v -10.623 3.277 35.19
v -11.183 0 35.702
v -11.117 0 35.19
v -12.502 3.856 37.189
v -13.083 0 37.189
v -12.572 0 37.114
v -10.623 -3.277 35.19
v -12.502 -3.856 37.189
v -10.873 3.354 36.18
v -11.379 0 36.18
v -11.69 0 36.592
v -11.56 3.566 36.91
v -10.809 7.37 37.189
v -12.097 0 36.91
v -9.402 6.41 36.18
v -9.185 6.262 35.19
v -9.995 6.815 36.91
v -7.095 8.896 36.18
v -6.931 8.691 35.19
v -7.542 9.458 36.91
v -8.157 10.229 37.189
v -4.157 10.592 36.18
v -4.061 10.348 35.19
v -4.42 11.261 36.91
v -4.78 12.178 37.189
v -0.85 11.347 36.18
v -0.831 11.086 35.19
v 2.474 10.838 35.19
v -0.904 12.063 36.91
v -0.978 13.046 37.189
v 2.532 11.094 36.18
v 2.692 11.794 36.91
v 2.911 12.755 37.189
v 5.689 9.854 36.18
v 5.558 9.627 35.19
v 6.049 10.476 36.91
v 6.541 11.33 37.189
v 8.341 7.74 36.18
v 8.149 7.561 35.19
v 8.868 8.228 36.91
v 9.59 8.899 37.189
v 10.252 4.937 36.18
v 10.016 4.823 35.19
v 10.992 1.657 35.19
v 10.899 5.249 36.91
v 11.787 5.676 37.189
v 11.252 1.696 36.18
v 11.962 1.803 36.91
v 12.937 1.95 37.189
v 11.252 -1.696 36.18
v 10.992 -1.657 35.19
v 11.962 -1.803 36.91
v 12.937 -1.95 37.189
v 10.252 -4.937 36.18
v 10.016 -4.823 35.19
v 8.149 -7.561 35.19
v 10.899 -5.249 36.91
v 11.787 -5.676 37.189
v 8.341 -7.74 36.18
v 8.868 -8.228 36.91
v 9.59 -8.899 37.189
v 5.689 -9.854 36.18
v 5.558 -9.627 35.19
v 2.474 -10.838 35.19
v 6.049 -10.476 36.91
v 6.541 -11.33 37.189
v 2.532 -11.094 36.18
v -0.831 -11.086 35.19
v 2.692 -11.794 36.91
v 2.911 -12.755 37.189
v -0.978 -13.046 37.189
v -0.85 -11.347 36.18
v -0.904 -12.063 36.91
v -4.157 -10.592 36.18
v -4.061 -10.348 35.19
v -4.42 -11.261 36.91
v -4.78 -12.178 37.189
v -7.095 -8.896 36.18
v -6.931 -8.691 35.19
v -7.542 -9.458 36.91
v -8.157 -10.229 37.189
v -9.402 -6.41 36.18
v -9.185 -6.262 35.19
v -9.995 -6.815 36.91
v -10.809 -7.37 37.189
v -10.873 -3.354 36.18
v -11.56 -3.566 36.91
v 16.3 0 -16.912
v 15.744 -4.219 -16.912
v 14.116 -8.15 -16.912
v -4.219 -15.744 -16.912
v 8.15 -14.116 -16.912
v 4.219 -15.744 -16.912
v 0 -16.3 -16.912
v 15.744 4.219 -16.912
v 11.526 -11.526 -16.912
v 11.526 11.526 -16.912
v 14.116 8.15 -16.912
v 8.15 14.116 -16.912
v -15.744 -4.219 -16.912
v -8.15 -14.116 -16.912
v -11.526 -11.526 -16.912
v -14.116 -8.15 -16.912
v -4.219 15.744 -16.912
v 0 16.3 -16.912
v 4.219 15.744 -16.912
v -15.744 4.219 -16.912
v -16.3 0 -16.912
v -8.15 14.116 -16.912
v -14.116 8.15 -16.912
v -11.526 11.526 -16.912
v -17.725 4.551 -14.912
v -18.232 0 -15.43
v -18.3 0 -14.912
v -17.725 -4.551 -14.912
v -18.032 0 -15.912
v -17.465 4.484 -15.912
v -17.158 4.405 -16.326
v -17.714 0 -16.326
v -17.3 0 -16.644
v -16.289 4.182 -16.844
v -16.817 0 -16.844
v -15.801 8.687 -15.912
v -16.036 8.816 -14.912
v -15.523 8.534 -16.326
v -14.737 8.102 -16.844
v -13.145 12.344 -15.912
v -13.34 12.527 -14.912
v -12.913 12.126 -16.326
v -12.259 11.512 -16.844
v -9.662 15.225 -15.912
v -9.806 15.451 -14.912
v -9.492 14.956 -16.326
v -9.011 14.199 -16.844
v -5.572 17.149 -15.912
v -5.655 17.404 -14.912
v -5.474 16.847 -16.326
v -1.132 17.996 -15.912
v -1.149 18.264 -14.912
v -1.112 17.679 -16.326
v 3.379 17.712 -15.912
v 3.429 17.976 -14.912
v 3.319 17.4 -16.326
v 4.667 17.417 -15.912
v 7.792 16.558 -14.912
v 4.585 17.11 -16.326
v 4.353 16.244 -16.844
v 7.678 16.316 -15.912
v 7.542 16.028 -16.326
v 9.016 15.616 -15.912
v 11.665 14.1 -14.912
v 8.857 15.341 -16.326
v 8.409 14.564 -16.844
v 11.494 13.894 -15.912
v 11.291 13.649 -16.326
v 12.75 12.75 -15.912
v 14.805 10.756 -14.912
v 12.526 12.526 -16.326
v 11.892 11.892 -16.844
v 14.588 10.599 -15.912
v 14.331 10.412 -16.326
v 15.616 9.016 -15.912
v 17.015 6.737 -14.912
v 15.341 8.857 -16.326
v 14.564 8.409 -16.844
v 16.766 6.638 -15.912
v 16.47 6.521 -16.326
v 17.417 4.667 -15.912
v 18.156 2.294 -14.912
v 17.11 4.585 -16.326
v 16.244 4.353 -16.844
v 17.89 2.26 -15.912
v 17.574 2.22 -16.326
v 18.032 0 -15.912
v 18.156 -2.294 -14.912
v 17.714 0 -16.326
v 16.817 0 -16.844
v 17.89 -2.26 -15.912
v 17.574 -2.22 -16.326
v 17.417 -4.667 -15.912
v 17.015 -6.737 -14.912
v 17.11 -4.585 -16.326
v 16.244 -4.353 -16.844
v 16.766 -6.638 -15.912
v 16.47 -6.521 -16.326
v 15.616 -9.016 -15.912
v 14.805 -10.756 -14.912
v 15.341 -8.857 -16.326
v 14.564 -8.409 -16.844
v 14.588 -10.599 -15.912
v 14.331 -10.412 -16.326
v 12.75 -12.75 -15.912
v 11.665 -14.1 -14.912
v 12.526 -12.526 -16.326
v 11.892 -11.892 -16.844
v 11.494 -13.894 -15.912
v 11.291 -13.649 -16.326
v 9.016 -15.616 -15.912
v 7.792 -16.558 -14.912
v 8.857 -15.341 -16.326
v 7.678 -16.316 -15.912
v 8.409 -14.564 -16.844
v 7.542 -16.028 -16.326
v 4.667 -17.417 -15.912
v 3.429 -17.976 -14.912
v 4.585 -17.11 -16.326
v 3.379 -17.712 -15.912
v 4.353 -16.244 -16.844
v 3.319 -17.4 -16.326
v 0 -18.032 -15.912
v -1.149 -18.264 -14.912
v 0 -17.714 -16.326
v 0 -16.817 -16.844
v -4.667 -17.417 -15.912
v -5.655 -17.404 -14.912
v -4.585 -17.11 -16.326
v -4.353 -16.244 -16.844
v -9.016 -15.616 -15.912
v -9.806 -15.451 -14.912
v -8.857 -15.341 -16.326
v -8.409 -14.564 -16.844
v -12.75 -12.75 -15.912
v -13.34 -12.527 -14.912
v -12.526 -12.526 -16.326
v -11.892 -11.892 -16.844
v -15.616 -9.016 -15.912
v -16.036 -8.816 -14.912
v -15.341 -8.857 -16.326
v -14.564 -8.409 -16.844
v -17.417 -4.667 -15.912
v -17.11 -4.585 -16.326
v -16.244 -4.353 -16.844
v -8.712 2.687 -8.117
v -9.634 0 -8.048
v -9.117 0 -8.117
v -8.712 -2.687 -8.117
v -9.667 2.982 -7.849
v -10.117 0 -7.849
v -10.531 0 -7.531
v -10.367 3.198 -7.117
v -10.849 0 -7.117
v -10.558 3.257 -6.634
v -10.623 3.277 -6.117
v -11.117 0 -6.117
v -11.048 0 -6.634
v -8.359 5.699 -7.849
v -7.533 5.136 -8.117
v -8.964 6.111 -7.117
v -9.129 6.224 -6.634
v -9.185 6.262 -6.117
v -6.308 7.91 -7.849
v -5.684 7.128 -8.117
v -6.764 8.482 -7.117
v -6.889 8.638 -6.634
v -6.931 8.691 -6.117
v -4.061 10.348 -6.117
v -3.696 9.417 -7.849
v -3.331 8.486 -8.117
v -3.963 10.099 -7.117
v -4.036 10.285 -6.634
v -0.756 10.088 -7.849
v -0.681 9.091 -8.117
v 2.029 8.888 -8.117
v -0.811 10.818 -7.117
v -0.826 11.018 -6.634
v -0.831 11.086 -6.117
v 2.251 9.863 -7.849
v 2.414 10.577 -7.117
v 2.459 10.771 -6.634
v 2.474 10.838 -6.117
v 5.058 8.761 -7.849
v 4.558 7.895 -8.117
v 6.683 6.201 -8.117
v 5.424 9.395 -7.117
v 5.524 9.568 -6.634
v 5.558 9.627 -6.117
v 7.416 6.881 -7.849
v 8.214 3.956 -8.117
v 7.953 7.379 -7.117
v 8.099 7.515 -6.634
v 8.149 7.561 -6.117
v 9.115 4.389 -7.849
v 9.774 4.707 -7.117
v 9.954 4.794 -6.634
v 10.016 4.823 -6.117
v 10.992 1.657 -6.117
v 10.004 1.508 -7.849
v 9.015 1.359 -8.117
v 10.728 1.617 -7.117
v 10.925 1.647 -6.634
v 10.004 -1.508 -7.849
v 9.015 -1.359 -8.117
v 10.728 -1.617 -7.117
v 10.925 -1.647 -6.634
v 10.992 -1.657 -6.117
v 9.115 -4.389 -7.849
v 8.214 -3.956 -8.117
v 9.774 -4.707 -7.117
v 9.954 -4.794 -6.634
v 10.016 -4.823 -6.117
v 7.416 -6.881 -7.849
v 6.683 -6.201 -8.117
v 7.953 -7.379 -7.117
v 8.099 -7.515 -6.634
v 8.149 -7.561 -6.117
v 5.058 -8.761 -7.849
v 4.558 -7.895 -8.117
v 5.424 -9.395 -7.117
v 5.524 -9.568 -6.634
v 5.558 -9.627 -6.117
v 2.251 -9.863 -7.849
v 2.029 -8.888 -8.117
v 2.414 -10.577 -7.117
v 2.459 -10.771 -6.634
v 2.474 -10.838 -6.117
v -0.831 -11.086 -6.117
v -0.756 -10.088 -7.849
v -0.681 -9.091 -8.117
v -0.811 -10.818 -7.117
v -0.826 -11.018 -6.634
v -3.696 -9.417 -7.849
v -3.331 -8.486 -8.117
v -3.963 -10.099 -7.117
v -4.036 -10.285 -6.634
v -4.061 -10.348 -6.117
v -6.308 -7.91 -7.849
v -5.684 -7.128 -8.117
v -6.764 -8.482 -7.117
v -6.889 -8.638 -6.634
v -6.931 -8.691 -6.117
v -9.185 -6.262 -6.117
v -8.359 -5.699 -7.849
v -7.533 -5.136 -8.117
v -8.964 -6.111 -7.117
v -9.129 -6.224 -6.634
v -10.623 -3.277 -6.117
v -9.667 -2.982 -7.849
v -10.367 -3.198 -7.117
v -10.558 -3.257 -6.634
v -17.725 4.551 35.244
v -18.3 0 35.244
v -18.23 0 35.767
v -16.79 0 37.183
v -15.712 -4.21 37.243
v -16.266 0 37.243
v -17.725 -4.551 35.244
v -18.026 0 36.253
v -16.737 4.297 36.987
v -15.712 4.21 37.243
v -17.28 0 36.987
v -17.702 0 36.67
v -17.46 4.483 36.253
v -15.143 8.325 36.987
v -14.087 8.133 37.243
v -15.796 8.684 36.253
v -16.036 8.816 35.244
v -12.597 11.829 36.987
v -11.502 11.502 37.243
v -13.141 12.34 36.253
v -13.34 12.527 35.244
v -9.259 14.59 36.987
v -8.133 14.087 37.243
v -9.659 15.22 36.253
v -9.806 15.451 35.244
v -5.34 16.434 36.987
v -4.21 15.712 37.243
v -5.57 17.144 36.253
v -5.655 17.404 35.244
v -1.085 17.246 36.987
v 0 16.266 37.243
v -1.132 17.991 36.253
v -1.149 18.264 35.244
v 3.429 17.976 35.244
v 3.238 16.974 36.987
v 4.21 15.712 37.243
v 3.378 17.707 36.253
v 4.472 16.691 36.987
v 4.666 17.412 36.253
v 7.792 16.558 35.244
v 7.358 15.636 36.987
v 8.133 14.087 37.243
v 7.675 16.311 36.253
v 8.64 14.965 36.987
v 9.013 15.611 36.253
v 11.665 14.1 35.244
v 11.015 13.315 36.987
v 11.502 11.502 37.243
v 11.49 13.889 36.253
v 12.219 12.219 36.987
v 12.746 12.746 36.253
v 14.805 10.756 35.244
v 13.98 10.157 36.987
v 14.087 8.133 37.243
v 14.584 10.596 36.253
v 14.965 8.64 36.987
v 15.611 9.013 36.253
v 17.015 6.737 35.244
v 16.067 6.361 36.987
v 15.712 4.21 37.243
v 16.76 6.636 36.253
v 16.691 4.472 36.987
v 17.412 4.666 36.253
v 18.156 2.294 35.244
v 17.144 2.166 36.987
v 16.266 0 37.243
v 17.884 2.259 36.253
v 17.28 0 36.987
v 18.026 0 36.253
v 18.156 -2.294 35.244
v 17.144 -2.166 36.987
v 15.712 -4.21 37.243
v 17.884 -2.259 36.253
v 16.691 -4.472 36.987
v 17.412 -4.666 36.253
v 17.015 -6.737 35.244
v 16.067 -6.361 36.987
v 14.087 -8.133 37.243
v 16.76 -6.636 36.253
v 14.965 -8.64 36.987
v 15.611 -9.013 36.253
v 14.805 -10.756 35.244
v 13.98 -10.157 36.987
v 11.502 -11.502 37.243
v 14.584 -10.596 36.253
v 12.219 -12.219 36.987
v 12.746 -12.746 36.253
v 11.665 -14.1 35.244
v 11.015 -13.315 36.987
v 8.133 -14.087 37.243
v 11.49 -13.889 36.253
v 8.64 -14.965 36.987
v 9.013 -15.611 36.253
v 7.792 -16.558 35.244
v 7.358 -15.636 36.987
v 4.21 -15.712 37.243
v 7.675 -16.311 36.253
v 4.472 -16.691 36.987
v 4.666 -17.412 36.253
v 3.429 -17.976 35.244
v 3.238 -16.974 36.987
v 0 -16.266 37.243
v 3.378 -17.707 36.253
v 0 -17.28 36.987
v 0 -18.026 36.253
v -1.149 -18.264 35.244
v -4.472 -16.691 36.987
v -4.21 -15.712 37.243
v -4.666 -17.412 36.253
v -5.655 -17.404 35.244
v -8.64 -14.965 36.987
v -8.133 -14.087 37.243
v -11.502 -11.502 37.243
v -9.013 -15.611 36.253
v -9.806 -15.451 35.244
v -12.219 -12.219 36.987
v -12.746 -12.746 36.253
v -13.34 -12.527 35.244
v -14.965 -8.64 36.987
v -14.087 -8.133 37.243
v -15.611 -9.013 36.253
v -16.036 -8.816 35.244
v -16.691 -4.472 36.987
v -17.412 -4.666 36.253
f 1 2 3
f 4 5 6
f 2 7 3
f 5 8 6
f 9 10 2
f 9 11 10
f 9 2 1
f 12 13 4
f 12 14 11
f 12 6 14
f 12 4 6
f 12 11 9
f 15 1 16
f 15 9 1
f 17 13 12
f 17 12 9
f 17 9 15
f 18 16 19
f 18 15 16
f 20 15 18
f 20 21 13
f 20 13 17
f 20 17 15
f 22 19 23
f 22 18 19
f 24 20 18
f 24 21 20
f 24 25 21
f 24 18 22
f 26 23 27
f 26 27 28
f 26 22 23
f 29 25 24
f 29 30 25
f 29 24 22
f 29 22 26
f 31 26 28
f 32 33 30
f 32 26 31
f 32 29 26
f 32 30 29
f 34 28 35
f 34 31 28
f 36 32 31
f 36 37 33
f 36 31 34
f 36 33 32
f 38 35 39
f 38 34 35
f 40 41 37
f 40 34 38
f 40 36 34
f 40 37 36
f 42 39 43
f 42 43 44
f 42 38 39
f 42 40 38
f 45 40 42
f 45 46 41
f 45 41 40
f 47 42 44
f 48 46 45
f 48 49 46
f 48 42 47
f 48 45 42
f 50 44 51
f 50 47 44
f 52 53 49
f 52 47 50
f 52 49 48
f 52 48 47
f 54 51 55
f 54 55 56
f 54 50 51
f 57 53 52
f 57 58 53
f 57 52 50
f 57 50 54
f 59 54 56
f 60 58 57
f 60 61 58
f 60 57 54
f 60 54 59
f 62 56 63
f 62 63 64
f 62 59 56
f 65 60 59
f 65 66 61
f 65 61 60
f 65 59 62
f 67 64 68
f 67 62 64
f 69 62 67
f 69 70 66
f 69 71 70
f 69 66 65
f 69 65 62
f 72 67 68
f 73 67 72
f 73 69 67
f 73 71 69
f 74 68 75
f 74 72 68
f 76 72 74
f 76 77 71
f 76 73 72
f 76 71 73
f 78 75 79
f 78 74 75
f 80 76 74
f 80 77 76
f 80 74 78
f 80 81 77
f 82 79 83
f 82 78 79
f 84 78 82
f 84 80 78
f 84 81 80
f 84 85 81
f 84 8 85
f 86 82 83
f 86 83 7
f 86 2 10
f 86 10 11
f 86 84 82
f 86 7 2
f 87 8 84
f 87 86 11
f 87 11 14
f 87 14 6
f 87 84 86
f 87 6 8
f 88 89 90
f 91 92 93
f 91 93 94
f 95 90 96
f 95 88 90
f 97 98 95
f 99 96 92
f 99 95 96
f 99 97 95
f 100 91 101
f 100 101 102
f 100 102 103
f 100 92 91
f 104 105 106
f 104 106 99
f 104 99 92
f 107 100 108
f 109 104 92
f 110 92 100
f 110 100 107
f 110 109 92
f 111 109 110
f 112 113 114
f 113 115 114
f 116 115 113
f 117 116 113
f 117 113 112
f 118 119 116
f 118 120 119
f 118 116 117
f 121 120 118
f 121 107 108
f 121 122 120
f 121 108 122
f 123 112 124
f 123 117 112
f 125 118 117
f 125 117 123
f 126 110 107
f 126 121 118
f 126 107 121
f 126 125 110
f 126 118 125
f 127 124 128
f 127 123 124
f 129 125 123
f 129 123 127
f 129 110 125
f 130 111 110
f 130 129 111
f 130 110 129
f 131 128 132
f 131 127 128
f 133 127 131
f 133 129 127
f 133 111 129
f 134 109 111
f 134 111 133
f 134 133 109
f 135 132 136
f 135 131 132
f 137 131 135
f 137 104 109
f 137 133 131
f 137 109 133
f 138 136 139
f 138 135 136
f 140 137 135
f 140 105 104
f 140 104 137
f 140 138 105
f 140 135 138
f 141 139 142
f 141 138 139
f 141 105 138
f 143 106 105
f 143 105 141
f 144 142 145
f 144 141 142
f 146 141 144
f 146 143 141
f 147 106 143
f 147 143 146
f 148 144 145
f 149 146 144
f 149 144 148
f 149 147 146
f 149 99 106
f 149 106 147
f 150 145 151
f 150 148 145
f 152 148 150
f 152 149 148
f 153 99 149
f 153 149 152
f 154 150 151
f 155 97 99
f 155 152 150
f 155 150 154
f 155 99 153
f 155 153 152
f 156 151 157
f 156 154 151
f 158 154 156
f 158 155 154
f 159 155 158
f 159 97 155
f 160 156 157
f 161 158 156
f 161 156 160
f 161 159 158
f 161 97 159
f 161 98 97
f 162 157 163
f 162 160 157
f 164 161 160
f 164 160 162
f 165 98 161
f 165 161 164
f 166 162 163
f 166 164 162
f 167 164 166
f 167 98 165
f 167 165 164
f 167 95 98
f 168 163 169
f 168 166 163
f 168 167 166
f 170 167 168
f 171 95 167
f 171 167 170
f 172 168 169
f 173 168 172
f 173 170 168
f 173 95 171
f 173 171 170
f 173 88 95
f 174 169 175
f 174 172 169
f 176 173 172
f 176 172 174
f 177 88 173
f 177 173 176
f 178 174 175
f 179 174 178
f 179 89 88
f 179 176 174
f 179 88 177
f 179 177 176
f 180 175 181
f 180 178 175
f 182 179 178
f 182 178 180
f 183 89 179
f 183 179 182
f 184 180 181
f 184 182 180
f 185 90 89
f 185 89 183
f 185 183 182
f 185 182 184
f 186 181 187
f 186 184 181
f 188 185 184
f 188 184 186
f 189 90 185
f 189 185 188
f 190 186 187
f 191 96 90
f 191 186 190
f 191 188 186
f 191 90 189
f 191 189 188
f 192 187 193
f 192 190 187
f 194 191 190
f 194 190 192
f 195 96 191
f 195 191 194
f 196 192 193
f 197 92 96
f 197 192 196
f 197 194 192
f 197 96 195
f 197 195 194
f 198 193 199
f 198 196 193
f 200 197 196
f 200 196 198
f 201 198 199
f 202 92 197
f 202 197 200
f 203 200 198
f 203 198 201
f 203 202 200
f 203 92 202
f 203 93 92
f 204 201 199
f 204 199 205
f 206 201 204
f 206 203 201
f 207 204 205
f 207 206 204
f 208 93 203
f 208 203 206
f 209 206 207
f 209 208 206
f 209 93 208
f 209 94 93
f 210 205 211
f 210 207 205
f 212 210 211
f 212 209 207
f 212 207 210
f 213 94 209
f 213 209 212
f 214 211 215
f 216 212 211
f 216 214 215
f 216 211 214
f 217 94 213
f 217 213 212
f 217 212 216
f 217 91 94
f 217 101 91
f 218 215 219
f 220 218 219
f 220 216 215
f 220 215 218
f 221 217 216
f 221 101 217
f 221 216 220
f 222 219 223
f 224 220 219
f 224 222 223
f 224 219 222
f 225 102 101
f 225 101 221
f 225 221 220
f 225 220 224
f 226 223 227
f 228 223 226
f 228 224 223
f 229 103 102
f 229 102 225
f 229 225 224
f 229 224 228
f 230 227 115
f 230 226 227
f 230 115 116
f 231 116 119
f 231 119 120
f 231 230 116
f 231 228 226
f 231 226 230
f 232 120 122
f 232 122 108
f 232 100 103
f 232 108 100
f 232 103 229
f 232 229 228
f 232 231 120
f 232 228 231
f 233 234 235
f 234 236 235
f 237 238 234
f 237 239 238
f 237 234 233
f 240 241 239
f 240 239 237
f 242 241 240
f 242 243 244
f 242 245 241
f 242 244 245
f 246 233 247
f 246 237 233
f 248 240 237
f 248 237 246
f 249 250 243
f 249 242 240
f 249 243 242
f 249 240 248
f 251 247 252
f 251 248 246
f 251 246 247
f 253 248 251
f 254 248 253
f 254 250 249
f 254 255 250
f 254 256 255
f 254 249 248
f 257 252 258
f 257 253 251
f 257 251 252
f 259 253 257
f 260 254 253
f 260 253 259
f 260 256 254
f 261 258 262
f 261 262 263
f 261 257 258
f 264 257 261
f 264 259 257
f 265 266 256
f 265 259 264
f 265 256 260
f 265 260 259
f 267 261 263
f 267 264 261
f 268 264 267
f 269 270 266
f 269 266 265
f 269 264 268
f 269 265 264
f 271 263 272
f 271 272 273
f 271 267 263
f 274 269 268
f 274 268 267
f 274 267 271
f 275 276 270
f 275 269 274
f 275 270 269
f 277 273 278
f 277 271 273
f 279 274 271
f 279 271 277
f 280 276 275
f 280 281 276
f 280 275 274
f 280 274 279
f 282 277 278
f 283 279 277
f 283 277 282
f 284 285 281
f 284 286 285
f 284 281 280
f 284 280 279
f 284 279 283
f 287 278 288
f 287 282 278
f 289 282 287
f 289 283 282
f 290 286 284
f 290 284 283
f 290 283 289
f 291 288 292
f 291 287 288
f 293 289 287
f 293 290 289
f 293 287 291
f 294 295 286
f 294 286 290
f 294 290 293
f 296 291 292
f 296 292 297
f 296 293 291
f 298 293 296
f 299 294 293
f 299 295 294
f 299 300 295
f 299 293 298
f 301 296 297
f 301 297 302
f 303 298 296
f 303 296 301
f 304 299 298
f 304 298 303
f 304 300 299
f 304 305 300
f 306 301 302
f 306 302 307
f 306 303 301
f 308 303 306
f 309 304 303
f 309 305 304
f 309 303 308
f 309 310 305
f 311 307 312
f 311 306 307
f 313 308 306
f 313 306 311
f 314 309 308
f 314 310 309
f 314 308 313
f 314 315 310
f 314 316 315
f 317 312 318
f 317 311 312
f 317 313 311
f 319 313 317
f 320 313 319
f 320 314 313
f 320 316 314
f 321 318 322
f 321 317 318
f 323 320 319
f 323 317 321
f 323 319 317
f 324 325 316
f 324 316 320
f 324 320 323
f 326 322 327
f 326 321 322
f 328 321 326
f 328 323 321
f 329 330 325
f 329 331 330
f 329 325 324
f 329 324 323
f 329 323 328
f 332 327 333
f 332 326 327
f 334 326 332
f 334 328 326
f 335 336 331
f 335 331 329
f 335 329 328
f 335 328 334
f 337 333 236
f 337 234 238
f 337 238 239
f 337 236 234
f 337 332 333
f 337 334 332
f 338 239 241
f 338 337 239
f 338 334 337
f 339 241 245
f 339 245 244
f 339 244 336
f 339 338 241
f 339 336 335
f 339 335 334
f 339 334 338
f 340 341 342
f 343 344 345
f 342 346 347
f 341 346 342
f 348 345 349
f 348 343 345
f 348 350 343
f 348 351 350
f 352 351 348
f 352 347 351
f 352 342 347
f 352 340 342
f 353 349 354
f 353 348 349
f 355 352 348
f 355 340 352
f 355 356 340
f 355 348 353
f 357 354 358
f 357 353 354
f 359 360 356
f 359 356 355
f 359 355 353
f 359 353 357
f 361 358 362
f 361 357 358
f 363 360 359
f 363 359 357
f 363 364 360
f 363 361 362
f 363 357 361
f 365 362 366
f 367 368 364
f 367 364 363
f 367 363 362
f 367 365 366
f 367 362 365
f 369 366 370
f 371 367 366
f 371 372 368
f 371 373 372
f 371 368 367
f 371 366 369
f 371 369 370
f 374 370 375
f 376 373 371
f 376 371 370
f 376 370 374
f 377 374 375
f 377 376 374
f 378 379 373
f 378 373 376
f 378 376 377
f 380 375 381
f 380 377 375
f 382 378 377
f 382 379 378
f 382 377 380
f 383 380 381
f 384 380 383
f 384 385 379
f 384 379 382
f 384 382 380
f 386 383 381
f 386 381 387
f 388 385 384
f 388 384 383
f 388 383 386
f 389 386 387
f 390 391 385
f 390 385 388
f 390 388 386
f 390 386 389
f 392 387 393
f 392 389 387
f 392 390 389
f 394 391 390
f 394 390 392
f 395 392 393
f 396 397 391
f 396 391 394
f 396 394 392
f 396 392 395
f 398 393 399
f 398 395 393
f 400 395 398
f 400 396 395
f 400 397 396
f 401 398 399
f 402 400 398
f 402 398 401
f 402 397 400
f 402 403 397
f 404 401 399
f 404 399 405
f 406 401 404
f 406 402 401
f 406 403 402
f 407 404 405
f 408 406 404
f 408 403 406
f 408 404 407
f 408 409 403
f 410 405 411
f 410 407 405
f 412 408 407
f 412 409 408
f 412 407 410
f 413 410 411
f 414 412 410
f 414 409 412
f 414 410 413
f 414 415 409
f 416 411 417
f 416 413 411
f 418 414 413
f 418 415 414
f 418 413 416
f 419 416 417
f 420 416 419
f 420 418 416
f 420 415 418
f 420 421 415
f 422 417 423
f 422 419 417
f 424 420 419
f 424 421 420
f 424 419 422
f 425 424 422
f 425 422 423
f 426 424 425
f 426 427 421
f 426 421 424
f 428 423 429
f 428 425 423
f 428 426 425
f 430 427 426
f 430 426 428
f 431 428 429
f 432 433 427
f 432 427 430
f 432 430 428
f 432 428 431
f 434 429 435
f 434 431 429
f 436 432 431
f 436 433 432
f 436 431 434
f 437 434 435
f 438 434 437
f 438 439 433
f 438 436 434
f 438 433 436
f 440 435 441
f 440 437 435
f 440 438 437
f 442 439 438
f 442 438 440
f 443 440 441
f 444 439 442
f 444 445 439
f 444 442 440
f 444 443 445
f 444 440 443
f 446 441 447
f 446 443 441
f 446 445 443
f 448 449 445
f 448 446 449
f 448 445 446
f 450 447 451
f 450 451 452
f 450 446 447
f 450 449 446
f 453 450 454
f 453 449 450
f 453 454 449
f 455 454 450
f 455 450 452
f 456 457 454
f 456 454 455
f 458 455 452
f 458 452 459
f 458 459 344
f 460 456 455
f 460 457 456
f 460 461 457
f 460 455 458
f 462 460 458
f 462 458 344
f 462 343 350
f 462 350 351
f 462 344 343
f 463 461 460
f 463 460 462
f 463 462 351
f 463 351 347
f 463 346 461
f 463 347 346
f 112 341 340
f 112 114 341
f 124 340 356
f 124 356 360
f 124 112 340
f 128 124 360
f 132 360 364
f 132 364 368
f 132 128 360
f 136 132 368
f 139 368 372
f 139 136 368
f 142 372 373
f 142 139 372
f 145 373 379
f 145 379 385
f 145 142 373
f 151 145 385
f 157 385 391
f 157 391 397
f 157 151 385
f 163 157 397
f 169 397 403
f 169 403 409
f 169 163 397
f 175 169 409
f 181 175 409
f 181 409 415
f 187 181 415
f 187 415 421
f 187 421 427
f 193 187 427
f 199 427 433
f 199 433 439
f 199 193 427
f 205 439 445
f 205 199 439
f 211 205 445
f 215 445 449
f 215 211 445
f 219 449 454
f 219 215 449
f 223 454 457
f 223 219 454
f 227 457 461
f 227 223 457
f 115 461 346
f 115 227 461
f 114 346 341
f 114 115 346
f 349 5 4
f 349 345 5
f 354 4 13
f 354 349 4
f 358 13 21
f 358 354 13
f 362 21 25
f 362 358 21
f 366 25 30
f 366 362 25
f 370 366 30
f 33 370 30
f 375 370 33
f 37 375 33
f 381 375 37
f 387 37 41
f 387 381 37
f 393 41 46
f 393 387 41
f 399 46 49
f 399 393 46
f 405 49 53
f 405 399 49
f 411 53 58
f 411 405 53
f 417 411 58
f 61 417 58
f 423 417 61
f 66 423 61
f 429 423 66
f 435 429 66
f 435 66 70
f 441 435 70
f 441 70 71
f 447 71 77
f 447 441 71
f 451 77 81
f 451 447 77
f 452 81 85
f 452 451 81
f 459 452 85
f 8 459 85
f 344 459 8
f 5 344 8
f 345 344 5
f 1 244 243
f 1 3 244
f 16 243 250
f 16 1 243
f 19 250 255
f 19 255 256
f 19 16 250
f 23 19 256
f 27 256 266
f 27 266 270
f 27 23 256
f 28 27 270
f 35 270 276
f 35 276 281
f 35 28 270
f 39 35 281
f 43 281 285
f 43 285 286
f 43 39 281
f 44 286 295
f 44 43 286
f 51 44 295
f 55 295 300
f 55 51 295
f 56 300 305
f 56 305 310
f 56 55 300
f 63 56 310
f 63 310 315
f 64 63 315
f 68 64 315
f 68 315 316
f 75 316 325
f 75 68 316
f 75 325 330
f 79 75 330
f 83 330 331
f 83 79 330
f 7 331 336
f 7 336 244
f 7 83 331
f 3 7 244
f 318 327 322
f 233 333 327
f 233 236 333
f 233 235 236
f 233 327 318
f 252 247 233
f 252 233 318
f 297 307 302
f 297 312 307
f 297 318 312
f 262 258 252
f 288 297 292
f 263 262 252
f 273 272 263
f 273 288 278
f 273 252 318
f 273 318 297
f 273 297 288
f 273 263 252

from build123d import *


with BuildPart() as f1:
    # F0 (on Front) → F1 (revolve)
    with BuildSketch(Plane.XZ):
        with BuildLine():
            ThreePointArc((-16.265942, 37.24327), (-17.702014, 36.669703), (-18.299835, 35.243557))
            Line((-18.299835, 35.243557), (-18.299835, -14.91217))
            ThreePointArc((-18.299835, -14.91217), (-17.714048, -16.326383), (-16.299835, -16.91217))
            Line((-16.299835, -16.91217), (0, -16.91217))
            Line((0, -16.91217), (0, -8.116585))
            Line((0, -8.116585), (-9.116645, -8.116585))
            ThreePointArc((-9.116645, -8.116585), (-10.530858, -7.530798), (-11.116645, -6.116585))
            Line((-11.116645, -6.116585), (-11.116645, 35.189605))
            ThreePointArc((-11.116645, 35.189605), (-11.690498, 36.591784), (-13.082751, 37.189318))
            Line((-13.082751, 37.189318), (-16.265942, 37.24327))
        make_face()
    revolve(axis=Axis((0, 0, 10.792887), (0, 0, -1)))


solid = f1.part
